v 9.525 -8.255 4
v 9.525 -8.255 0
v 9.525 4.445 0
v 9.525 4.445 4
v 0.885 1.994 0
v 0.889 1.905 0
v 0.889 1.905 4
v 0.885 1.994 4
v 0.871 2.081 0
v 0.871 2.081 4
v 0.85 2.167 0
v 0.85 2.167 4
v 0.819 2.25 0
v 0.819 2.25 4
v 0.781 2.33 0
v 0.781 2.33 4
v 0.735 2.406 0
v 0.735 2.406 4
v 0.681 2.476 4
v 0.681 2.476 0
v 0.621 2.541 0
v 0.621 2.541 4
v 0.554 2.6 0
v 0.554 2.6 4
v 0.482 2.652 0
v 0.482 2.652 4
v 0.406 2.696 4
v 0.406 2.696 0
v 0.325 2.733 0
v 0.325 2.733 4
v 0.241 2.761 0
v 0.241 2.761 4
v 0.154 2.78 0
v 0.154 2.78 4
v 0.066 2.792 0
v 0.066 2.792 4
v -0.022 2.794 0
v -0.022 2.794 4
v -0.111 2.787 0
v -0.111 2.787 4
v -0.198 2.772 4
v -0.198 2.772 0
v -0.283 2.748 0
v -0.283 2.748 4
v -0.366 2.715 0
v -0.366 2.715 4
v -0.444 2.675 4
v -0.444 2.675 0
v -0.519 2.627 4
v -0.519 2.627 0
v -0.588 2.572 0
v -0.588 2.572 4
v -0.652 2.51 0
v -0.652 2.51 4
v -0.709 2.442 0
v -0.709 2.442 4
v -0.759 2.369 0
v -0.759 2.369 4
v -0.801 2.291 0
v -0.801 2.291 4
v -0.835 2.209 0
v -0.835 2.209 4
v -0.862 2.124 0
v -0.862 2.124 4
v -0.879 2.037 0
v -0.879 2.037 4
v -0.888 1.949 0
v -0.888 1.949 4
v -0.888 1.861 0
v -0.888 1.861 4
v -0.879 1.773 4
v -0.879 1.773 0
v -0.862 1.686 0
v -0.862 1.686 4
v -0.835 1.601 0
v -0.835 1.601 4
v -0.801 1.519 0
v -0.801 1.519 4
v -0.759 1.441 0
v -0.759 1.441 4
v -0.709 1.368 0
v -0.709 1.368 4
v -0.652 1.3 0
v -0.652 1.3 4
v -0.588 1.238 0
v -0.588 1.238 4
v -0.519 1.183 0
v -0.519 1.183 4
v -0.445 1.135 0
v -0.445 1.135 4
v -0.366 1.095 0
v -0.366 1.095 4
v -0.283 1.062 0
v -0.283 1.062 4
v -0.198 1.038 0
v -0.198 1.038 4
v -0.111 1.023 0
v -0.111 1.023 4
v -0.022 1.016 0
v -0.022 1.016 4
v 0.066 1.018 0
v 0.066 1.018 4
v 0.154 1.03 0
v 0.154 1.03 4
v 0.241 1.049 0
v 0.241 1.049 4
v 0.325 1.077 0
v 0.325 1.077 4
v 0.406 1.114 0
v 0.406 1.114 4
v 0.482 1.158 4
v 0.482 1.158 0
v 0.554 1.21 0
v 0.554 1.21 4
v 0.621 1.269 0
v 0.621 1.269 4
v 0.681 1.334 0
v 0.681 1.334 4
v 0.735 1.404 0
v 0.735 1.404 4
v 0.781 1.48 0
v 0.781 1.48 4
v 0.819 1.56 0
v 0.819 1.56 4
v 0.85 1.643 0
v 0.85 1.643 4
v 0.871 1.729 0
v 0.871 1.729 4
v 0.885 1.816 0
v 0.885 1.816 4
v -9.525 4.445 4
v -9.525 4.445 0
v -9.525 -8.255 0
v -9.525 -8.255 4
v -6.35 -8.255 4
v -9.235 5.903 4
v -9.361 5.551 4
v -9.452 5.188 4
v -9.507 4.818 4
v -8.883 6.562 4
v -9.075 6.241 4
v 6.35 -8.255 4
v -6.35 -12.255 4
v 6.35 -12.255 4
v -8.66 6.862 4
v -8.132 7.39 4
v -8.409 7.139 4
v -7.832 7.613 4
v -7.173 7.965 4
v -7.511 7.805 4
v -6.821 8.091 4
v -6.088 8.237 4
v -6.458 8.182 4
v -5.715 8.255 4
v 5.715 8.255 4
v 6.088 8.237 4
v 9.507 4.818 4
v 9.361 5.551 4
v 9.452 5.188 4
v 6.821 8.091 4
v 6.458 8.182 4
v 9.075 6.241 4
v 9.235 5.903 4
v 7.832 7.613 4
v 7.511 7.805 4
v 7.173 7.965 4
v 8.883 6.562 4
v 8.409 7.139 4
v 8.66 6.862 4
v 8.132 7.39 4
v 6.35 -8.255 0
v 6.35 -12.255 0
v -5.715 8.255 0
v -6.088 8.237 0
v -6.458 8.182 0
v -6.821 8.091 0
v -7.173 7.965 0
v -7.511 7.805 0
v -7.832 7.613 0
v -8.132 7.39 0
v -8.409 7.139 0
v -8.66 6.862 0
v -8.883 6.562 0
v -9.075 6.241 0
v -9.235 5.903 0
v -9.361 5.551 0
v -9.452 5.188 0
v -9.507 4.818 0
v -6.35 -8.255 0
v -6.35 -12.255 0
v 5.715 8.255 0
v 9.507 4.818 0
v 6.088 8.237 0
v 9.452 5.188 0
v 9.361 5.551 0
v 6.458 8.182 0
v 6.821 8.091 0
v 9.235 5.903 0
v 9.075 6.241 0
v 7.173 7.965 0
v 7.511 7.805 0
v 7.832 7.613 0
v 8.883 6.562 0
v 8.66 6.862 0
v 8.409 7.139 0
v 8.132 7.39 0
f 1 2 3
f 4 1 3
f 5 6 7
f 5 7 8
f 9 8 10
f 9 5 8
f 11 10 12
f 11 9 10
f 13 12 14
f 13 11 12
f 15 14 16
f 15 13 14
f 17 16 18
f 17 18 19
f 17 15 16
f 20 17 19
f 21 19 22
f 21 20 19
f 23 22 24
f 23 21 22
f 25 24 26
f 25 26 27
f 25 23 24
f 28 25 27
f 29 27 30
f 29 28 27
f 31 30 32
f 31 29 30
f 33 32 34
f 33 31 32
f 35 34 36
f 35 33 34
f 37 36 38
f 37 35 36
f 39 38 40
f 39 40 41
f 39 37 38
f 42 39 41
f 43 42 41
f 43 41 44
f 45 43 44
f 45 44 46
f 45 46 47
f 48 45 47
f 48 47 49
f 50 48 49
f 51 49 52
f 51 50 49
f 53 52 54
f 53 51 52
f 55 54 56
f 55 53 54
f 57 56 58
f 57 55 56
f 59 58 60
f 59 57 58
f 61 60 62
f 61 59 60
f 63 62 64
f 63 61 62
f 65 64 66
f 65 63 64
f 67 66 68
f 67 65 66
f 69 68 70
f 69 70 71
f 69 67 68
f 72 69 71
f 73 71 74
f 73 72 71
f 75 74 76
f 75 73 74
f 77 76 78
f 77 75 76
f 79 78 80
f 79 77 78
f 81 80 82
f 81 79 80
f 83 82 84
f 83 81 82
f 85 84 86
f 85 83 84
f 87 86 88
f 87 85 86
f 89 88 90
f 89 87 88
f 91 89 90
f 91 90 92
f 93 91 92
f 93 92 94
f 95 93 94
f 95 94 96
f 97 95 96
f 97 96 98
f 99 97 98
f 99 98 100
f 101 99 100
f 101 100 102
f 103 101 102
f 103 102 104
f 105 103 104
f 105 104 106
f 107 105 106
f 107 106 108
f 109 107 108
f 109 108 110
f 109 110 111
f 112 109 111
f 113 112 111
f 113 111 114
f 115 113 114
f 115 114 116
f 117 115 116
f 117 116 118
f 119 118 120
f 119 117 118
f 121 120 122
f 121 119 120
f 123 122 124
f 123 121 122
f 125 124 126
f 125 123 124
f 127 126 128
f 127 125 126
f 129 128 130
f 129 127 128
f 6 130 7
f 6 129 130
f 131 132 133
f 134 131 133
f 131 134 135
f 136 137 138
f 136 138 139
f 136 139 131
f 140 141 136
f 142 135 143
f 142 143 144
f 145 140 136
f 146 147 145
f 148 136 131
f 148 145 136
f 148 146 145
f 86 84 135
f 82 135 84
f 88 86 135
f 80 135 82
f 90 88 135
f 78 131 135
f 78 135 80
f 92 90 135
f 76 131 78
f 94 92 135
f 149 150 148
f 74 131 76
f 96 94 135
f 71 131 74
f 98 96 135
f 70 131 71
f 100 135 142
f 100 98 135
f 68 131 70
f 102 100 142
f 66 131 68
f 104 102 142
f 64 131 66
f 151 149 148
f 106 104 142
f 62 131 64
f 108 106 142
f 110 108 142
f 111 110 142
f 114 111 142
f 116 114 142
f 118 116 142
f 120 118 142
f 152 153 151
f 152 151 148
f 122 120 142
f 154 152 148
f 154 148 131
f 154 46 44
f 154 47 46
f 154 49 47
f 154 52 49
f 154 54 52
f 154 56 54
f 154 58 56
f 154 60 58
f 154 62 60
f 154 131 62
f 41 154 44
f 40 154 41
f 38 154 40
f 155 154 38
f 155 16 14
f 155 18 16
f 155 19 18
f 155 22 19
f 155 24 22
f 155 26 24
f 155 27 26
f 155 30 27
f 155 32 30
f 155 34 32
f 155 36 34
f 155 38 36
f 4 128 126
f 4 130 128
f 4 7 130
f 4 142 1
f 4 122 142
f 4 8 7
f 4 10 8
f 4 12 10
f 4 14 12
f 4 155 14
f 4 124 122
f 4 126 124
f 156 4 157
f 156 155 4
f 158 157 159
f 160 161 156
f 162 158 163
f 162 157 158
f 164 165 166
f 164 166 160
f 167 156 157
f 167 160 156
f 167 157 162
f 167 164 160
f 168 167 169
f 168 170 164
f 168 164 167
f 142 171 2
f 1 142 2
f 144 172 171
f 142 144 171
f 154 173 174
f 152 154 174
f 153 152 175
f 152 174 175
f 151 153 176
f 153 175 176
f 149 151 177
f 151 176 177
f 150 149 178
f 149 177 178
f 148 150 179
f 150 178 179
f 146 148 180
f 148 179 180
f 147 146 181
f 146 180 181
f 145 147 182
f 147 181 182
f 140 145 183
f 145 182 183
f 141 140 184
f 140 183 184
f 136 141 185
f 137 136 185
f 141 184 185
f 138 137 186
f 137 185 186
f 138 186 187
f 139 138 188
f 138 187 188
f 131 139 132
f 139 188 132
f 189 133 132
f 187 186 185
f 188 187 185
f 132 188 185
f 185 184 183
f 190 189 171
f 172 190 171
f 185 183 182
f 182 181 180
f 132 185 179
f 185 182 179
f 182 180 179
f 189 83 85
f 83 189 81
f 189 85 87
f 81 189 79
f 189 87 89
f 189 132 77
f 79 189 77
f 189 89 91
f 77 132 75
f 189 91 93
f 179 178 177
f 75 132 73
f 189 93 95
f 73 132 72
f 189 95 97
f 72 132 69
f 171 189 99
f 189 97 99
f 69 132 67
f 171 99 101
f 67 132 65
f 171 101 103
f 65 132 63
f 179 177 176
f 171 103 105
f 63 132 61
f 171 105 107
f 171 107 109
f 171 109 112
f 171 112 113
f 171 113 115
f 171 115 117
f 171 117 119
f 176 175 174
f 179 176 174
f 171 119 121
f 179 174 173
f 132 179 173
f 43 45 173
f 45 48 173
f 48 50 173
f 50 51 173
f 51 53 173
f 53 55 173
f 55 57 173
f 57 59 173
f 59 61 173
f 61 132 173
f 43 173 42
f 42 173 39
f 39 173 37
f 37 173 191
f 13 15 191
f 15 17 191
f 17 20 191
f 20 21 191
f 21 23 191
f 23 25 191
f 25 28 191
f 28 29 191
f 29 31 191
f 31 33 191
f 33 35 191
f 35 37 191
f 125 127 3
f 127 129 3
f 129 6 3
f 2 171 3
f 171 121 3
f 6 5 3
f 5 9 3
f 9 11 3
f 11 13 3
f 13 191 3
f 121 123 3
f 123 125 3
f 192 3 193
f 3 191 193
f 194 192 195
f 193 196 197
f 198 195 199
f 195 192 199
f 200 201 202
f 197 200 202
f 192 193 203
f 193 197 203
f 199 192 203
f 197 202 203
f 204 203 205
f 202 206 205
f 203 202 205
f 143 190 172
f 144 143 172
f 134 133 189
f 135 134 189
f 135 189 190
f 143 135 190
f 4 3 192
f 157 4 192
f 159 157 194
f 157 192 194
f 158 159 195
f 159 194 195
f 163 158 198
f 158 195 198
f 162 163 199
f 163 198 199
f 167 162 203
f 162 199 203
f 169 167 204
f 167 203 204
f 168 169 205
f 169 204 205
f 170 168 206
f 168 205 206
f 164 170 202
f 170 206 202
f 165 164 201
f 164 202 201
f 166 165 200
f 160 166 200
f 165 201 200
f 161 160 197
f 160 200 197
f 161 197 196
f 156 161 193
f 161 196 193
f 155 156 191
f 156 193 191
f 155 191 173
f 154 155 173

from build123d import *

# Parameters (mm, degrees)
SKETCH2_R           = 0.889
BOSS_EXTRUDE1_DEPTH = 4


with BuildPart() as part:
    # Sketch2 → Boss-Extrude1 (new body)
    with BuildSketch(Plane.XY):
        with BuildLine():
            Line((-9.525, -8.255), (-6.35, -8.255))
            Line((-6.35, -8.255), (-6.35, -12.255))
            Line((-6.35, -12.255), (6.35, -12.255))
            Line((6.35, -12.255), (6.35, -8.255))
            Line((6.35, -8.255), (9.525, -8.255))
            Line((9.525, -8.255), (9.525, 4.445))
            ThreePointArc((9.525, 4.445), (8.409076836, 7.139076836), (5.715, 8.255))
            Line((5.715, 8.255), (-5.715, 8.255))
            ThreePointArc((-5.715, 8.255), (-8.409076836, 7.139076836), (-9.525, 4.445))
            Line((-9.525, 4.445), (-9.525, -8.255))
        make_face()
        with Locations((0, 1.905)):
            Circle(SKETCH2_R, mode=Mode.SUBTRACT)
    extrude(amount=BOSS_EXTRUDE1_DEPTH)


solid = part.part
